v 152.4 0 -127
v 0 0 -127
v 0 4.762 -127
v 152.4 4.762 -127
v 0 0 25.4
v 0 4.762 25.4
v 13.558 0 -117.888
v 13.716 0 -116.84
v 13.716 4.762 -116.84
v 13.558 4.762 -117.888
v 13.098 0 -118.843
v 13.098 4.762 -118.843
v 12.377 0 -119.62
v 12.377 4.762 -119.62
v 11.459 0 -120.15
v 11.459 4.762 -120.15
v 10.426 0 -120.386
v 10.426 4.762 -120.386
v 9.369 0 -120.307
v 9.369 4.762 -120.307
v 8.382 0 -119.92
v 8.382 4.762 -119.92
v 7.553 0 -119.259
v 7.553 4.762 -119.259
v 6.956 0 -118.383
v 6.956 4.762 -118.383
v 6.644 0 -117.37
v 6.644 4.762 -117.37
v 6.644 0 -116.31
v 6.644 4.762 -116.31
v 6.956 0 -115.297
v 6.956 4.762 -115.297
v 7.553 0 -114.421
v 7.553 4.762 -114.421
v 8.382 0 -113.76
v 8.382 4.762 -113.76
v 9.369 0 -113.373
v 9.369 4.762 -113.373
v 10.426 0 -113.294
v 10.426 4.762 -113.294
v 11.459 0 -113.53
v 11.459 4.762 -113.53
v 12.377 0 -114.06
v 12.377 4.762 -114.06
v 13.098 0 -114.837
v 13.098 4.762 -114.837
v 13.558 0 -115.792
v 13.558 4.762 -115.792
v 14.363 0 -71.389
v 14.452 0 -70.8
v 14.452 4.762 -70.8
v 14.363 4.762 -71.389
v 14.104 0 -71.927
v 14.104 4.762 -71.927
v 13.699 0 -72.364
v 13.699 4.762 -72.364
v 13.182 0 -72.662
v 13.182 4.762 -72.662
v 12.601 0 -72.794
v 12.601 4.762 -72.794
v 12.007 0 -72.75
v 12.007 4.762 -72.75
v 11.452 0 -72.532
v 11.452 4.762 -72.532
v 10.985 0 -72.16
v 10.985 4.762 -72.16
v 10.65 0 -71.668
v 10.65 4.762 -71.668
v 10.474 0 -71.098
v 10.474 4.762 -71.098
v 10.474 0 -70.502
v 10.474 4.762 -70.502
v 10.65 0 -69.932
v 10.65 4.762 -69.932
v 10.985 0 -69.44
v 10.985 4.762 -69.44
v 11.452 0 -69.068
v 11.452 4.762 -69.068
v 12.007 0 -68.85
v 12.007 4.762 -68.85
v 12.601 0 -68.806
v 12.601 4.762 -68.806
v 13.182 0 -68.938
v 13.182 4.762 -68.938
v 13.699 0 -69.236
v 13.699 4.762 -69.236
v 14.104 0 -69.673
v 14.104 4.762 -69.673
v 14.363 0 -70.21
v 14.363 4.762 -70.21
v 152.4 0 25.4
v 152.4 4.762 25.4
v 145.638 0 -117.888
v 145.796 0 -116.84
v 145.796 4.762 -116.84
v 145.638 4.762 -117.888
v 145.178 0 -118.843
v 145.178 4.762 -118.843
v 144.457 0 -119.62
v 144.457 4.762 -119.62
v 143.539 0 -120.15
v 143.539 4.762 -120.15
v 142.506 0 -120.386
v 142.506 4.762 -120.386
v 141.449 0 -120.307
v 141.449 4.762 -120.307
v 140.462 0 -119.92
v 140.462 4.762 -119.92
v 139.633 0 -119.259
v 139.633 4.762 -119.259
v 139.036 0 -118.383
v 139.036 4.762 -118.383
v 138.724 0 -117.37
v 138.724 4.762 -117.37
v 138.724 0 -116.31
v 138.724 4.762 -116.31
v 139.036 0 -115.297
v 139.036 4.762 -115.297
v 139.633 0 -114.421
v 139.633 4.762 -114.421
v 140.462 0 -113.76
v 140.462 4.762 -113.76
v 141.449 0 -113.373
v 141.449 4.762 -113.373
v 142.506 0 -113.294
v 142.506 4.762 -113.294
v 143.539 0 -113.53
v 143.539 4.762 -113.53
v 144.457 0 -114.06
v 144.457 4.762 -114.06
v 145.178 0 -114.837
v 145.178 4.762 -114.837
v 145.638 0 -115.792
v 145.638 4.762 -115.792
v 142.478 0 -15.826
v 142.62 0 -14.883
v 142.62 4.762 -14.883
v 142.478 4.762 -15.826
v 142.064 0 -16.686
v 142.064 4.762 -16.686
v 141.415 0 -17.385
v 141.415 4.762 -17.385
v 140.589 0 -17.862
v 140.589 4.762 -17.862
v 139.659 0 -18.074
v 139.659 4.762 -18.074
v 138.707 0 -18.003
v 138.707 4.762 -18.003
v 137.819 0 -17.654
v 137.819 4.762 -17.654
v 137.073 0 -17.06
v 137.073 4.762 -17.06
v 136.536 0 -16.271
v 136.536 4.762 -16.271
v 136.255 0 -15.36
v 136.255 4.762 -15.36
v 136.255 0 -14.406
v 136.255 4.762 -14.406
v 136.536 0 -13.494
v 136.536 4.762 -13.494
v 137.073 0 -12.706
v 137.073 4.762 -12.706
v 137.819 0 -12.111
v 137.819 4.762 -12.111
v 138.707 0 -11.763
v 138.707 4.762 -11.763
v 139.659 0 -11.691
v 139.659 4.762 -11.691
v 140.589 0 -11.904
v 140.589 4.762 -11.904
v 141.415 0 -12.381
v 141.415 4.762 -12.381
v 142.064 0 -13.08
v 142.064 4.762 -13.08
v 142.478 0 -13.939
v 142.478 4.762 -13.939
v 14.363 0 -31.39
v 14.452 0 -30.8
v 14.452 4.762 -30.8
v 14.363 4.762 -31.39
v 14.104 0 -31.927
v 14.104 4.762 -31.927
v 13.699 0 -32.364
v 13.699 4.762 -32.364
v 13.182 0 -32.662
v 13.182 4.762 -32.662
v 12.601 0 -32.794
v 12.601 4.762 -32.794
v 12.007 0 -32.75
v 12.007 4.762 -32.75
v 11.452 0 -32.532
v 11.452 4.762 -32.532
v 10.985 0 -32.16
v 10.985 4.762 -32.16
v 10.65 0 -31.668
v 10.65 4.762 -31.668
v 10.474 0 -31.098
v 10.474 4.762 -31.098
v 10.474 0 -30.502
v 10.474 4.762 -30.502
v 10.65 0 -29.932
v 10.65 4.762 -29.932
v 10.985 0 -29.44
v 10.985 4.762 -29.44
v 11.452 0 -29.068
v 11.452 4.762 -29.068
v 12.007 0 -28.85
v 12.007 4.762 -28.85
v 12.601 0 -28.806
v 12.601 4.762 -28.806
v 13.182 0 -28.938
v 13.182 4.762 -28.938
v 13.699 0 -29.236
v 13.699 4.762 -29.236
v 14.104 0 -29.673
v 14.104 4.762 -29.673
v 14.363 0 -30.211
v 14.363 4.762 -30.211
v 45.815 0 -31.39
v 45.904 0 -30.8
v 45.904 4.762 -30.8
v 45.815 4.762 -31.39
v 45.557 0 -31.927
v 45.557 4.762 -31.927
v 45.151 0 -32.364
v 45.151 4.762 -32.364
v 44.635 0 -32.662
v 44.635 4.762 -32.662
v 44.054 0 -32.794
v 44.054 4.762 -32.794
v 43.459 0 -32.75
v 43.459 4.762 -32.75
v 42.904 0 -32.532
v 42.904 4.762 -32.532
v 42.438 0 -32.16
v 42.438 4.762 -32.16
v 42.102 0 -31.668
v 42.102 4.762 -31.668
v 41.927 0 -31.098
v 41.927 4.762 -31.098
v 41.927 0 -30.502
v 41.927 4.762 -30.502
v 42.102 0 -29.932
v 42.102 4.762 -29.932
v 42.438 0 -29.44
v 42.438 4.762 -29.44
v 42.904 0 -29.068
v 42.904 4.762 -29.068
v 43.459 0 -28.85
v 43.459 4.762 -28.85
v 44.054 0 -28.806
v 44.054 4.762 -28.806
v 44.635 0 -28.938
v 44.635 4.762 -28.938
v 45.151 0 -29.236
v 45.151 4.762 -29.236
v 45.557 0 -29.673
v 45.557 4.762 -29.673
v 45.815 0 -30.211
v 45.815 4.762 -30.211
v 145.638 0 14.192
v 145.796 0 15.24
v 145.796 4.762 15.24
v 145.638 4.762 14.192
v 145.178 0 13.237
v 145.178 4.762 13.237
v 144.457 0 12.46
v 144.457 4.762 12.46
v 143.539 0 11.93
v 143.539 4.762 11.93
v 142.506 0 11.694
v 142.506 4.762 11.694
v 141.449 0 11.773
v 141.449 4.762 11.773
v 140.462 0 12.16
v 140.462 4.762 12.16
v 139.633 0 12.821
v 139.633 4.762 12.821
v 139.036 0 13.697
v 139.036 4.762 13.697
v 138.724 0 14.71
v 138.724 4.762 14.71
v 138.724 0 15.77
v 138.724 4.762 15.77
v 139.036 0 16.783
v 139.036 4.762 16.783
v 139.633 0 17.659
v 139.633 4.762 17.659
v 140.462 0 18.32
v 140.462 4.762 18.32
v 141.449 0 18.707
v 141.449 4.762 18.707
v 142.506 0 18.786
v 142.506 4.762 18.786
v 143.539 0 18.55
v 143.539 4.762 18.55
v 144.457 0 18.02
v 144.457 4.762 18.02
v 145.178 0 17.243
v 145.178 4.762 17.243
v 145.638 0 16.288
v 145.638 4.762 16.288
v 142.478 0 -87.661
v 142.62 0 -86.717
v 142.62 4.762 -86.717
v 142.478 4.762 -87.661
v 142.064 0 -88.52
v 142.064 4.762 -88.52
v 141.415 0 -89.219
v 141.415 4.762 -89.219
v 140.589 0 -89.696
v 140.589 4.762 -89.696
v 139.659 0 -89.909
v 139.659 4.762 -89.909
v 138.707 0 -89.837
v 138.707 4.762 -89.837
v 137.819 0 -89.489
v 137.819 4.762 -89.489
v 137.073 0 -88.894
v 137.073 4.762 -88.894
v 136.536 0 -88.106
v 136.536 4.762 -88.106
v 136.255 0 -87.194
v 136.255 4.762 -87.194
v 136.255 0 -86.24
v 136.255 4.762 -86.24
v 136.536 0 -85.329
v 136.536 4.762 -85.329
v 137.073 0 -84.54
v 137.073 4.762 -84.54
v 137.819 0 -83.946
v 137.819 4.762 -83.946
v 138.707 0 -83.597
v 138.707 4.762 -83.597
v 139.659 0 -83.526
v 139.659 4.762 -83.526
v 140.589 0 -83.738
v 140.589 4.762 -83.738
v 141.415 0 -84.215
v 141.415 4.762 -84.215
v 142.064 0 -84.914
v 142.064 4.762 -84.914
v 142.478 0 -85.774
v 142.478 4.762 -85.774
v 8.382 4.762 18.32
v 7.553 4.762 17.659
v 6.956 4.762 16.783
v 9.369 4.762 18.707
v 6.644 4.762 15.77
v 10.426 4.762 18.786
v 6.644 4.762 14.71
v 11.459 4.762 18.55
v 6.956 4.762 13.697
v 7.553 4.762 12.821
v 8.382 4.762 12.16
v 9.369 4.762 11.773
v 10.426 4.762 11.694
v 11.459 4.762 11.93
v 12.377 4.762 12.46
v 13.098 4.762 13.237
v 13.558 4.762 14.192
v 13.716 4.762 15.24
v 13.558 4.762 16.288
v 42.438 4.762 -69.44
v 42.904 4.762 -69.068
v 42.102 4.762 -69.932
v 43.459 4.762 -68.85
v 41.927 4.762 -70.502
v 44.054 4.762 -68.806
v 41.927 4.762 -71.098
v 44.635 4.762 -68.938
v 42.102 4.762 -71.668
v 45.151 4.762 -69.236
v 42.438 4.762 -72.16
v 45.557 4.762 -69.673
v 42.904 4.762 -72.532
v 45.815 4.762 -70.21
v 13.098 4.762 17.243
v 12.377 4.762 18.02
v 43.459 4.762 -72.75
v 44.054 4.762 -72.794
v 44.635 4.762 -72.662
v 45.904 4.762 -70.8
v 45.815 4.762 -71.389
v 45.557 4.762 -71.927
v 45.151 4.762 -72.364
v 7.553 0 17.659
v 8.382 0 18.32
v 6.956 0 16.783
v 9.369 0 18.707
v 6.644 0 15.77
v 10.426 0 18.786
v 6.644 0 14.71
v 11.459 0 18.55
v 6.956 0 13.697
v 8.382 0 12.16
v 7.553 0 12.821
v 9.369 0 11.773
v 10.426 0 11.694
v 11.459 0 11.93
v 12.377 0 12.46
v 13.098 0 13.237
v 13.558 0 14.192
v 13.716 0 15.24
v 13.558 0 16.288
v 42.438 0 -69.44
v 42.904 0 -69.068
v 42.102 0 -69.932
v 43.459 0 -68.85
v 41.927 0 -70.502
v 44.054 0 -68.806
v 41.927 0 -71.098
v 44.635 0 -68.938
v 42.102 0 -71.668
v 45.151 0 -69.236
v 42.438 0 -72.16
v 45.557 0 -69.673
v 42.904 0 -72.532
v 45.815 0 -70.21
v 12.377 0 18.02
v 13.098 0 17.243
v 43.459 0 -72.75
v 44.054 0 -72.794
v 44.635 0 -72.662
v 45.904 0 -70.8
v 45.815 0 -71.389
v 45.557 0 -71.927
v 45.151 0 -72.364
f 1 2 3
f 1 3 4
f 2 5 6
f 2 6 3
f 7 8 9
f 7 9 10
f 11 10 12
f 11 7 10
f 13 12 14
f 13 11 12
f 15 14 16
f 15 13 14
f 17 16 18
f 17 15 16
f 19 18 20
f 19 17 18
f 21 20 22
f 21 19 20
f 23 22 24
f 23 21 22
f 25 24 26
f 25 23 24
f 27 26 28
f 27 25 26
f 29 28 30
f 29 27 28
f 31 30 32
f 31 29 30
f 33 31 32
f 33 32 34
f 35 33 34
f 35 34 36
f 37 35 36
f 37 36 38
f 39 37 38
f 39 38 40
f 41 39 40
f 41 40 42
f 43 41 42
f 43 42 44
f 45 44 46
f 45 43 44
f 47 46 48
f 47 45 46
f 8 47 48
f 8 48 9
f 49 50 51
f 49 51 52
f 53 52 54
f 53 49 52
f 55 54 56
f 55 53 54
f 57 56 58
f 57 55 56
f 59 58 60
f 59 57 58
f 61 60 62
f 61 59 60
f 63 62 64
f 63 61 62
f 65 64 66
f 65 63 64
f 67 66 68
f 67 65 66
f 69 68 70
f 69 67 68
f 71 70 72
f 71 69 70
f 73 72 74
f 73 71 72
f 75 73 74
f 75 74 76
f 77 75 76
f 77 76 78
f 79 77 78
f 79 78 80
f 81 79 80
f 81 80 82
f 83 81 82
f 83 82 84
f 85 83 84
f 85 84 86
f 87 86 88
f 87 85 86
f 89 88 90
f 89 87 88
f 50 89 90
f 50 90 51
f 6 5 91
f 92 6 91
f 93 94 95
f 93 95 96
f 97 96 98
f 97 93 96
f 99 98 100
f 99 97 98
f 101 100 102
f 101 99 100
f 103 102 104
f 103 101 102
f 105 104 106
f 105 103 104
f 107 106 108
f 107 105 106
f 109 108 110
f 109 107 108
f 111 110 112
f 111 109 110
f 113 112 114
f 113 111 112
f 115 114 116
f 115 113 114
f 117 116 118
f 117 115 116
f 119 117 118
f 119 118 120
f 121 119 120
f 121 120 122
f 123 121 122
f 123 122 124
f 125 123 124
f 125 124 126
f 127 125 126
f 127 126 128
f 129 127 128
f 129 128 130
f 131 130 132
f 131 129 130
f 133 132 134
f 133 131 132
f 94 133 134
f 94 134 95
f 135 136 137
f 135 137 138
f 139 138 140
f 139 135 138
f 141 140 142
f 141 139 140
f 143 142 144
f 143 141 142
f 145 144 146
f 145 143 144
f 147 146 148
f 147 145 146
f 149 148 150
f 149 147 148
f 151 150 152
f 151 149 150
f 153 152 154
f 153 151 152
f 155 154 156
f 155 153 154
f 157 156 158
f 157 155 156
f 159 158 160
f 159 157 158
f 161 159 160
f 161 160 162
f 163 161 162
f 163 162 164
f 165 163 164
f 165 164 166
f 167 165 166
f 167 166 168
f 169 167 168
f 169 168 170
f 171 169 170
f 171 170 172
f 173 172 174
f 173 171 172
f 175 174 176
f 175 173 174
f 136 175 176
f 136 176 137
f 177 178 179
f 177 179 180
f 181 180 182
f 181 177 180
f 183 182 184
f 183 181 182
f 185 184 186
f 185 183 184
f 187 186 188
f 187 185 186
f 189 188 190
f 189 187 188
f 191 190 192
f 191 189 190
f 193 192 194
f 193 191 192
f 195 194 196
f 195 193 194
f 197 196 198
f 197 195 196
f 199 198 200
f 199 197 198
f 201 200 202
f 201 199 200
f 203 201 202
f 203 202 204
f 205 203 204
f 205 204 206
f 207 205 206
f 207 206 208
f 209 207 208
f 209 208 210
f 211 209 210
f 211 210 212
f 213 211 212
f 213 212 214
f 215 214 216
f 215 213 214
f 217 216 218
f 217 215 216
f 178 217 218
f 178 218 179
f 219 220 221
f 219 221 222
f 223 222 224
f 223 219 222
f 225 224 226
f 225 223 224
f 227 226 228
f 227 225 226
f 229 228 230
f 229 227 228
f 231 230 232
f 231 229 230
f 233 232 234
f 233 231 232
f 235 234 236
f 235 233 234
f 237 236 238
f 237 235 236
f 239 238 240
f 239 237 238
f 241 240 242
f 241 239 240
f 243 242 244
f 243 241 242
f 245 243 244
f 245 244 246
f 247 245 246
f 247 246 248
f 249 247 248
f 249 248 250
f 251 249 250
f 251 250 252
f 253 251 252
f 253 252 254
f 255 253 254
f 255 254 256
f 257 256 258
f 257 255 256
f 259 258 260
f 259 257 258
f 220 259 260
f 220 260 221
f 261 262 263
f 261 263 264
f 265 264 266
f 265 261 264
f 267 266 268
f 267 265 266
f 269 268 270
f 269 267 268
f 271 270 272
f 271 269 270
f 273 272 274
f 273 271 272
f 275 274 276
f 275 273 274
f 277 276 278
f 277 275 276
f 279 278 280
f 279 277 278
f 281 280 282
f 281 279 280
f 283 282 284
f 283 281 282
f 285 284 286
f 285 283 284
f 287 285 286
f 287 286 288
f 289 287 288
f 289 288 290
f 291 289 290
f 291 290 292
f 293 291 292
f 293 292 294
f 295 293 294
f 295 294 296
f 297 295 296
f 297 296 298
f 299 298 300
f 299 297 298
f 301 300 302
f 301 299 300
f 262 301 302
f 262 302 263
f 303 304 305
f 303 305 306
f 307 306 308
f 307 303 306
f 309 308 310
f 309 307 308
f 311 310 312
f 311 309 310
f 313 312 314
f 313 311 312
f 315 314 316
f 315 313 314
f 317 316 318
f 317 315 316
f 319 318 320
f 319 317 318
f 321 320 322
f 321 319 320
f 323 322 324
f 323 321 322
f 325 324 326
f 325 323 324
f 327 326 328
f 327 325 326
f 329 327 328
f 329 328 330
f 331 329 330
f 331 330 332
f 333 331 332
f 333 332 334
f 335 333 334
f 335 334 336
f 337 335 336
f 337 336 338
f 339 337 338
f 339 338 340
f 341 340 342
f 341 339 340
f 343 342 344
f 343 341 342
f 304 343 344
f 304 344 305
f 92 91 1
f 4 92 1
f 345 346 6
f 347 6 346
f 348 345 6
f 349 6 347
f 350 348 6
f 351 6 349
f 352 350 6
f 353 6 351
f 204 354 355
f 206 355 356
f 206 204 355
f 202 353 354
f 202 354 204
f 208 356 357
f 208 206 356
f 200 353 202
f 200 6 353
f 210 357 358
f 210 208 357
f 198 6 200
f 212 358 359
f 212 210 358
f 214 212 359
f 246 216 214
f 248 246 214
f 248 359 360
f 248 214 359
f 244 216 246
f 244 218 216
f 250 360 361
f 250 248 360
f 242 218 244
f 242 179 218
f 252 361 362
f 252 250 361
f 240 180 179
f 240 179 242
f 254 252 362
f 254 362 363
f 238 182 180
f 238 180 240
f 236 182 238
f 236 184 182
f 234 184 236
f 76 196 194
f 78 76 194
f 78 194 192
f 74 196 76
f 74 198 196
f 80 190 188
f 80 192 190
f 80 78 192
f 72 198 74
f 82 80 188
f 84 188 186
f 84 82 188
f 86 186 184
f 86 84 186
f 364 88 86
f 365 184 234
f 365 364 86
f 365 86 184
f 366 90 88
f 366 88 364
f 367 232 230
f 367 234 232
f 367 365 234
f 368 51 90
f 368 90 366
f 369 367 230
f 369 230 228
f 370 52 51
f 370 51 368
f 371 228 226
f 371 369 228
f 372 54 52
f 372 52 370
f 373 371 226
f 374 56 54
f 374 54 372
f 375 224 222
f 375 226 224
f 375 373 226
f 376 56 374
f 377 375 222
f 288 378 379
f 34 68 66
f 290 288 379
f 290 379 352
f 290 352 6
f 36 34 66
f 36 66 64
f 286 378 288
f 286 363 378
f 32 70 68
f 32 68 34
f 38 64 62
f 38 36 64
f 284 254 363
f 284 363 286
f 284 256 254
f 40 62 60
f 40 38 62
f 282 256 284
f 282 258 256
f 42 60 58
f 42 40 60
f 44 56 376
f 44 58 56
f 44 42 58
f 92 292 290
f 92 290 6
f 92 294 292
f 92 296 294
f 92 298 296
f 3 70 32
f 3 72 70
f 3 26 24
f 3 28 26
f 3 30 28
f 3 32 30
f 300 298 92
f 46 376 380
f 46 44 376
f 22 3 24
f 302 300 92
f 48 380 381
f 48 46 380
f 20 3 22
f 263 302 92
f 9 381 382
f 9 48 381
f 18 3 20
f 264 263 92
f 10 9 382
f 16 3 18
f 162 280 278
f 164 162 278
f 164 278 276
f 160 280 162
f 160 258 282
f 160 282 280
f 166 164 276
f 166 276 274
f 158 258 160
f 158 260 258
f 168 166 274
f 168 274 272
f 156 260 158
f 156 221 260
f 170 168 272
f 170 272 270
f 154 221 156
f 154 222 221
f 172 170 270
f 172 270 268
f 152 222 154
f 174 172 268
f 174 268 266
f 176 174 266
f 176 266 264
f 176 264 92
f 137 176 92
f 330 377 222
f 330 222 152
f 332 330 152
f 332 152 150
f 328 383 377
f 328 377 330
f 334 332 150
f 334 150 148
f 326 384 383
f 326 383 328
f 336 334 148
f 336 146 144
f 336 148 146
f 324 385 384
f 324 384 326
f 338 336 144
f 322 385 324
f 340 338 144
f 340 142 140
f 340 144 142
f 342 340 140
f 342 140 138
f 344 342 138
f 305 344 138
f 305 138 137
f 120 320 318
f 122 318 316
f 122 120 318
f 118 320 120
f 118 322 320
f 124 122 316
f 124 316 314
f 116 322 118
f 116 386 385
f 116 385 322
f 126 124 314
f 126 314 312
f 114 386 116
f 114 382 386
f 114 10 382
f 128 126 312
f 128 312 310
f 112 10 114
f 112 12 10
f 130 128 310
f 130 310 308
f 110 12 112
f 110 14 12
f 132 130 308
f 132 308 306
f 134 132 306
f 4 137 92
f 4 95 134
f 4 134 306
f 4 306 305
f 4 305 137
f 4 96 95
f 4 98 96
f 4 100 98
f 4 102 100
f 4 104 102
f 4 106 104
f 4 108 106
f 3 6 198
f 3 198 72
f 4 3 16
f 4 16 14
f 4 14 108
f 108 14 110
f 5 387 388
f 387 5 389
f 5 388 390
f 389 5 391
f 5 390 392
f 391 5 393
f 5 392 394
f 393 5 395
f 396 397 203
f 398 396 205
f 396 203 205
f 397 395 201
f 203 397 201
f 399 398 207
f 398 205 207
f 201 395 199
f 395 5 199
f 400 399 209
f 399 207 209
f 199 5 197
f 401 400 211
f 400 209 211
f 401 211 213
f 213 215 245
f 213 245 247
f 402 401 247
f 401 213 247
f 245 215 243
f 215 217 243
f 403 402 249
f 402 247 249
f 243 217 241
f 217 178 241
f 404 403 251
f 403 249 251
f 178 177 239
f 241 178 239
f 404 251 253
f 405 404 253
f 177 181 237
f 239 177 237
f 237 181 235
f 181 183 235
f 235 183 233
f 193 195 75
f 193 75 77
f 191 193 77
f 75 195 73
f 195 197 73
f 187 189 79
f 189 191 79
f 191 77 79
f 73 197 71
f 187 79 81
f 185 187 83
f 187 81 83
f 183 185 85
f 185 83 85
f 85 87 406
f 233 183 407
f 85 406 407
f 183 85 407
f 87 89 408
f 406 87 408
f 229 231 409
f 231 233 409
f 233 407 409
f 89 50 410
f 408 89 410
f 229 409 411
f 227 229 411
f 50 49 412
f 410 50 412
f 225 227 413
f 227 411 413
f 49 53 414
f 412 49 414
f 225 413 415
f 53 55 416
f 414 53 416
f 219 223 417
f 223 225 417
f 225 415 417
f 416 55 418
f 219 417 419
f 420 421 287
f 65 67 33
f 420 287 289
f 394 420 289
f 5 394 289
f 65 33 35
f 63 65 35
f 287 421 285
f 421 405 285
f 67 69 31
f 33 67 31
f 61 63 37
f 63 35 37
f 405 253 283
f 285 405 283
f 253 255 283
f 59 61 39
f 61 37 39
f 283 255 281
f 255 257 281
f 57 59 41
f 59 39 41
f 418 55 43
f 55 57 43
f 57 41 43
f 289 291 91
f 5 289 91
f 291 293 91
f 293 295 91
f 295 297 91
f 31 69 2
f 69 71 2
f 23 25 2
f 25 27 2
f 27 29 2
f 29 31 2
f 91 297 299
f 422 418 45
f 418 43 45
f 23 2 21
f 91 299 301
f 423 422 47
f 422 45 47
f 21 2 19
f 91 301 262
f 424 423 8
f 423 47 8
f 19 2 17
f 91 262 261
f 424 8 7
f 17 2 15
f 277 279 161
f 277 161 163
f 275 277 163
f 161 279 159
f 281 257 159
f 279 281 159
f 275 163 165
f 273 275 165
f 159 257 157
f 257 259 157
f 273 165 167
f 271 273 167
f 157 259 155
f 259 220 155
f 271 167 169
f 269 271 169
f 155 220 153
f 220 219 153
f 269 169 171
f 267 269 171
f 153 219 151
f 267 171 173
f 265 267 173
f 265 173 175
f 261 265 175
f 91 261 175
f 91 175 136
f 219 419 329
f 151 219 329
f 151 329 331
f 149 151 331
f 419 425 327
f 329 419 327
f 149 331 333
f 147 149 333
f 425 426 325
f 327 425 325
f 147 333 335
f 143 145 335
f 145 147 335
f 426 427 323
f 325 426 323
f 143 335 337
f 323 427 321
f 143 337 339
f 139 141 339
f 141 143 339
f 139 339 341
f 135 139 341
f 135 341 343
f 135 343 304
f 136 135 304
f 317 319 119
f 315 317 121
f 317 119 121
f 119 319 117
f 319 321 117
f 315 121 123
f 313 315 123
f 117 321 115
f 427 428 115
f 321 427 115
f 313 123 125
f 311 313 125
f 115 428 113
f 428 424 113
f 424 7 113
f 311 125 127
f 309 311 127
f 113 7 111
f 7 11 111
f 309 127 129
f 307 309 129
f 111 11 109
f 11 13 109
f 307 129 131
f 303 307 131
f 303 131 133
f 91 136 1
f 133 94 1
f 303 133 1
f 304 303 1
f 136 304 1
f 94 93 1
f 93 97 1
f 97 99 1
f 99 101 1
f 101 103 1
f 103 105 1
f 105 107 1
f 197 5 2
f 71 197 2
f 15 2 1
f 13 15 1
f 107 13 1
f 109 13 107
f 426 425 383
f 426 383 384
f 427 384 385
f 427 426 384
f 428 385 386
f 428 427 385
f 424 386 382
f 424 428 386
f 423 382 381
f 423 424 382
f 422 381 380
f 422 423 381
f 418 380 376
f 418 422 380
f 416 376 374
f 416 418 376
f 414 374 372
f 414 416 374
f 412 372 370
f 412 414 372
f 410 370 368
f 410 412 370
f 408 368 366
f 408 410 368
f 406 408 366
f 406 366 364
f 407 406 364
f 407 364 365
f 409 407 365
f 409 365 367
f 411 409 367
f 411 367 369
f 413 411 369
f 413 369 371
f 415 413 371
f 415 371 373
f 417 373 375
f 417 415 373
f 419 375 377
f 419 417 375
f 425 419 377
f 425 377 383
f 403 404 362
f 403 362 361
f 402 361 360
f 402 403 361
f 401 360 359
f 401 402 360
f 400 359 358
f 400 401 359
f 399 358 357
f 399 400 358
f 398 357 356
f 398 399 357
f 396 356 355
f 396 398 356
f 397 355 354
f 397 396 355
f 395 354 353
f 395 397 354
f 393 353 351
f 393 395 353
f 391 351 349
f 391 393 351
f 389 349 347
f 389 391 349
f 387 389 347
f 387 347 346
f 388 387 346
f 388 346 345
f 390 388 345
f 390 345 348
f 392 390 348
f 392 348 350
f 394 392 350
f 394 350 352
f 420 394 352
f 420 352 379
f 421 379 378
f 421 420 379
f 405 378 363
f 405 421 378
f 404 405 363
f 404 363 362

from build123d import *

# Parameters (mm, degrees)
SKETCH2_W           = 152.4
SKETCH2_H           = 152.4
SKETCH2_R           = 3.2004
SKETCH2_R_2         = 3.556
SKETCH2_R_3         = 2
BOSS_EXTRUDE1_DEPTH = 4.7625


with BuildPart() as part:
    # Sketch2 → Boss-Extrude1 (new body)
    with BuildSketch(Plane(origin=(0, 0, 0), x_dir=(1, 0, 0), z_dir=(0, 1, 0))):
        with Locations((76.2, 50.8)):
            Rectangle(SKETCH2_W, SKETCH2_H)
        with Locations((139.419367389, 14.8828125)):
            Circle(SKETCH2_R, mode=Mode.SUBTRACT)
        with Locations((139.419367389, 86.7171875)):
            Circle(SKETCH2_R, mode=Mode.SUBTRACT)
        with Locations((142.24, 116.84)):
            Circle(SKETCH2_R_2, mode=Mode.SUBTRACT)
        with Locations((10.16, 116.84)):
            Circle(SKETCH2_R_2, mode=Mode.SUBTRACT)
        with Locations((10.16, -15.24)):
            Circle(SKETCH2_R_2, mode=Mode.SUBTRACT)
        with Locations((142.24, -15.24)):
            Circle(SKETCH2_R_2, mode=Mode.SUBTRACT)
        with Locations((12.451545477, 30.80004)):
            Circle(SKETCH2_R_3, mode=Mode.SUBTRACT)
        with Locations((43.904269028, 30.80004)):
            Circle(SKETCH2_R_3, mode=Mode.SUBTRACT)
        with Locations((43.904269028, 70.79996)):
            Circle(SKETCH2_R_3, mode=Mode.SUBTRACT)
        with Locations((12.451545477, 70.79996)):
            Circle(SKETCH2_R_3, mode=Mode.SUBTRACT)
    extrude(amount=BOSS_EXTRUDE1_DEPTH)


solid = part.part
